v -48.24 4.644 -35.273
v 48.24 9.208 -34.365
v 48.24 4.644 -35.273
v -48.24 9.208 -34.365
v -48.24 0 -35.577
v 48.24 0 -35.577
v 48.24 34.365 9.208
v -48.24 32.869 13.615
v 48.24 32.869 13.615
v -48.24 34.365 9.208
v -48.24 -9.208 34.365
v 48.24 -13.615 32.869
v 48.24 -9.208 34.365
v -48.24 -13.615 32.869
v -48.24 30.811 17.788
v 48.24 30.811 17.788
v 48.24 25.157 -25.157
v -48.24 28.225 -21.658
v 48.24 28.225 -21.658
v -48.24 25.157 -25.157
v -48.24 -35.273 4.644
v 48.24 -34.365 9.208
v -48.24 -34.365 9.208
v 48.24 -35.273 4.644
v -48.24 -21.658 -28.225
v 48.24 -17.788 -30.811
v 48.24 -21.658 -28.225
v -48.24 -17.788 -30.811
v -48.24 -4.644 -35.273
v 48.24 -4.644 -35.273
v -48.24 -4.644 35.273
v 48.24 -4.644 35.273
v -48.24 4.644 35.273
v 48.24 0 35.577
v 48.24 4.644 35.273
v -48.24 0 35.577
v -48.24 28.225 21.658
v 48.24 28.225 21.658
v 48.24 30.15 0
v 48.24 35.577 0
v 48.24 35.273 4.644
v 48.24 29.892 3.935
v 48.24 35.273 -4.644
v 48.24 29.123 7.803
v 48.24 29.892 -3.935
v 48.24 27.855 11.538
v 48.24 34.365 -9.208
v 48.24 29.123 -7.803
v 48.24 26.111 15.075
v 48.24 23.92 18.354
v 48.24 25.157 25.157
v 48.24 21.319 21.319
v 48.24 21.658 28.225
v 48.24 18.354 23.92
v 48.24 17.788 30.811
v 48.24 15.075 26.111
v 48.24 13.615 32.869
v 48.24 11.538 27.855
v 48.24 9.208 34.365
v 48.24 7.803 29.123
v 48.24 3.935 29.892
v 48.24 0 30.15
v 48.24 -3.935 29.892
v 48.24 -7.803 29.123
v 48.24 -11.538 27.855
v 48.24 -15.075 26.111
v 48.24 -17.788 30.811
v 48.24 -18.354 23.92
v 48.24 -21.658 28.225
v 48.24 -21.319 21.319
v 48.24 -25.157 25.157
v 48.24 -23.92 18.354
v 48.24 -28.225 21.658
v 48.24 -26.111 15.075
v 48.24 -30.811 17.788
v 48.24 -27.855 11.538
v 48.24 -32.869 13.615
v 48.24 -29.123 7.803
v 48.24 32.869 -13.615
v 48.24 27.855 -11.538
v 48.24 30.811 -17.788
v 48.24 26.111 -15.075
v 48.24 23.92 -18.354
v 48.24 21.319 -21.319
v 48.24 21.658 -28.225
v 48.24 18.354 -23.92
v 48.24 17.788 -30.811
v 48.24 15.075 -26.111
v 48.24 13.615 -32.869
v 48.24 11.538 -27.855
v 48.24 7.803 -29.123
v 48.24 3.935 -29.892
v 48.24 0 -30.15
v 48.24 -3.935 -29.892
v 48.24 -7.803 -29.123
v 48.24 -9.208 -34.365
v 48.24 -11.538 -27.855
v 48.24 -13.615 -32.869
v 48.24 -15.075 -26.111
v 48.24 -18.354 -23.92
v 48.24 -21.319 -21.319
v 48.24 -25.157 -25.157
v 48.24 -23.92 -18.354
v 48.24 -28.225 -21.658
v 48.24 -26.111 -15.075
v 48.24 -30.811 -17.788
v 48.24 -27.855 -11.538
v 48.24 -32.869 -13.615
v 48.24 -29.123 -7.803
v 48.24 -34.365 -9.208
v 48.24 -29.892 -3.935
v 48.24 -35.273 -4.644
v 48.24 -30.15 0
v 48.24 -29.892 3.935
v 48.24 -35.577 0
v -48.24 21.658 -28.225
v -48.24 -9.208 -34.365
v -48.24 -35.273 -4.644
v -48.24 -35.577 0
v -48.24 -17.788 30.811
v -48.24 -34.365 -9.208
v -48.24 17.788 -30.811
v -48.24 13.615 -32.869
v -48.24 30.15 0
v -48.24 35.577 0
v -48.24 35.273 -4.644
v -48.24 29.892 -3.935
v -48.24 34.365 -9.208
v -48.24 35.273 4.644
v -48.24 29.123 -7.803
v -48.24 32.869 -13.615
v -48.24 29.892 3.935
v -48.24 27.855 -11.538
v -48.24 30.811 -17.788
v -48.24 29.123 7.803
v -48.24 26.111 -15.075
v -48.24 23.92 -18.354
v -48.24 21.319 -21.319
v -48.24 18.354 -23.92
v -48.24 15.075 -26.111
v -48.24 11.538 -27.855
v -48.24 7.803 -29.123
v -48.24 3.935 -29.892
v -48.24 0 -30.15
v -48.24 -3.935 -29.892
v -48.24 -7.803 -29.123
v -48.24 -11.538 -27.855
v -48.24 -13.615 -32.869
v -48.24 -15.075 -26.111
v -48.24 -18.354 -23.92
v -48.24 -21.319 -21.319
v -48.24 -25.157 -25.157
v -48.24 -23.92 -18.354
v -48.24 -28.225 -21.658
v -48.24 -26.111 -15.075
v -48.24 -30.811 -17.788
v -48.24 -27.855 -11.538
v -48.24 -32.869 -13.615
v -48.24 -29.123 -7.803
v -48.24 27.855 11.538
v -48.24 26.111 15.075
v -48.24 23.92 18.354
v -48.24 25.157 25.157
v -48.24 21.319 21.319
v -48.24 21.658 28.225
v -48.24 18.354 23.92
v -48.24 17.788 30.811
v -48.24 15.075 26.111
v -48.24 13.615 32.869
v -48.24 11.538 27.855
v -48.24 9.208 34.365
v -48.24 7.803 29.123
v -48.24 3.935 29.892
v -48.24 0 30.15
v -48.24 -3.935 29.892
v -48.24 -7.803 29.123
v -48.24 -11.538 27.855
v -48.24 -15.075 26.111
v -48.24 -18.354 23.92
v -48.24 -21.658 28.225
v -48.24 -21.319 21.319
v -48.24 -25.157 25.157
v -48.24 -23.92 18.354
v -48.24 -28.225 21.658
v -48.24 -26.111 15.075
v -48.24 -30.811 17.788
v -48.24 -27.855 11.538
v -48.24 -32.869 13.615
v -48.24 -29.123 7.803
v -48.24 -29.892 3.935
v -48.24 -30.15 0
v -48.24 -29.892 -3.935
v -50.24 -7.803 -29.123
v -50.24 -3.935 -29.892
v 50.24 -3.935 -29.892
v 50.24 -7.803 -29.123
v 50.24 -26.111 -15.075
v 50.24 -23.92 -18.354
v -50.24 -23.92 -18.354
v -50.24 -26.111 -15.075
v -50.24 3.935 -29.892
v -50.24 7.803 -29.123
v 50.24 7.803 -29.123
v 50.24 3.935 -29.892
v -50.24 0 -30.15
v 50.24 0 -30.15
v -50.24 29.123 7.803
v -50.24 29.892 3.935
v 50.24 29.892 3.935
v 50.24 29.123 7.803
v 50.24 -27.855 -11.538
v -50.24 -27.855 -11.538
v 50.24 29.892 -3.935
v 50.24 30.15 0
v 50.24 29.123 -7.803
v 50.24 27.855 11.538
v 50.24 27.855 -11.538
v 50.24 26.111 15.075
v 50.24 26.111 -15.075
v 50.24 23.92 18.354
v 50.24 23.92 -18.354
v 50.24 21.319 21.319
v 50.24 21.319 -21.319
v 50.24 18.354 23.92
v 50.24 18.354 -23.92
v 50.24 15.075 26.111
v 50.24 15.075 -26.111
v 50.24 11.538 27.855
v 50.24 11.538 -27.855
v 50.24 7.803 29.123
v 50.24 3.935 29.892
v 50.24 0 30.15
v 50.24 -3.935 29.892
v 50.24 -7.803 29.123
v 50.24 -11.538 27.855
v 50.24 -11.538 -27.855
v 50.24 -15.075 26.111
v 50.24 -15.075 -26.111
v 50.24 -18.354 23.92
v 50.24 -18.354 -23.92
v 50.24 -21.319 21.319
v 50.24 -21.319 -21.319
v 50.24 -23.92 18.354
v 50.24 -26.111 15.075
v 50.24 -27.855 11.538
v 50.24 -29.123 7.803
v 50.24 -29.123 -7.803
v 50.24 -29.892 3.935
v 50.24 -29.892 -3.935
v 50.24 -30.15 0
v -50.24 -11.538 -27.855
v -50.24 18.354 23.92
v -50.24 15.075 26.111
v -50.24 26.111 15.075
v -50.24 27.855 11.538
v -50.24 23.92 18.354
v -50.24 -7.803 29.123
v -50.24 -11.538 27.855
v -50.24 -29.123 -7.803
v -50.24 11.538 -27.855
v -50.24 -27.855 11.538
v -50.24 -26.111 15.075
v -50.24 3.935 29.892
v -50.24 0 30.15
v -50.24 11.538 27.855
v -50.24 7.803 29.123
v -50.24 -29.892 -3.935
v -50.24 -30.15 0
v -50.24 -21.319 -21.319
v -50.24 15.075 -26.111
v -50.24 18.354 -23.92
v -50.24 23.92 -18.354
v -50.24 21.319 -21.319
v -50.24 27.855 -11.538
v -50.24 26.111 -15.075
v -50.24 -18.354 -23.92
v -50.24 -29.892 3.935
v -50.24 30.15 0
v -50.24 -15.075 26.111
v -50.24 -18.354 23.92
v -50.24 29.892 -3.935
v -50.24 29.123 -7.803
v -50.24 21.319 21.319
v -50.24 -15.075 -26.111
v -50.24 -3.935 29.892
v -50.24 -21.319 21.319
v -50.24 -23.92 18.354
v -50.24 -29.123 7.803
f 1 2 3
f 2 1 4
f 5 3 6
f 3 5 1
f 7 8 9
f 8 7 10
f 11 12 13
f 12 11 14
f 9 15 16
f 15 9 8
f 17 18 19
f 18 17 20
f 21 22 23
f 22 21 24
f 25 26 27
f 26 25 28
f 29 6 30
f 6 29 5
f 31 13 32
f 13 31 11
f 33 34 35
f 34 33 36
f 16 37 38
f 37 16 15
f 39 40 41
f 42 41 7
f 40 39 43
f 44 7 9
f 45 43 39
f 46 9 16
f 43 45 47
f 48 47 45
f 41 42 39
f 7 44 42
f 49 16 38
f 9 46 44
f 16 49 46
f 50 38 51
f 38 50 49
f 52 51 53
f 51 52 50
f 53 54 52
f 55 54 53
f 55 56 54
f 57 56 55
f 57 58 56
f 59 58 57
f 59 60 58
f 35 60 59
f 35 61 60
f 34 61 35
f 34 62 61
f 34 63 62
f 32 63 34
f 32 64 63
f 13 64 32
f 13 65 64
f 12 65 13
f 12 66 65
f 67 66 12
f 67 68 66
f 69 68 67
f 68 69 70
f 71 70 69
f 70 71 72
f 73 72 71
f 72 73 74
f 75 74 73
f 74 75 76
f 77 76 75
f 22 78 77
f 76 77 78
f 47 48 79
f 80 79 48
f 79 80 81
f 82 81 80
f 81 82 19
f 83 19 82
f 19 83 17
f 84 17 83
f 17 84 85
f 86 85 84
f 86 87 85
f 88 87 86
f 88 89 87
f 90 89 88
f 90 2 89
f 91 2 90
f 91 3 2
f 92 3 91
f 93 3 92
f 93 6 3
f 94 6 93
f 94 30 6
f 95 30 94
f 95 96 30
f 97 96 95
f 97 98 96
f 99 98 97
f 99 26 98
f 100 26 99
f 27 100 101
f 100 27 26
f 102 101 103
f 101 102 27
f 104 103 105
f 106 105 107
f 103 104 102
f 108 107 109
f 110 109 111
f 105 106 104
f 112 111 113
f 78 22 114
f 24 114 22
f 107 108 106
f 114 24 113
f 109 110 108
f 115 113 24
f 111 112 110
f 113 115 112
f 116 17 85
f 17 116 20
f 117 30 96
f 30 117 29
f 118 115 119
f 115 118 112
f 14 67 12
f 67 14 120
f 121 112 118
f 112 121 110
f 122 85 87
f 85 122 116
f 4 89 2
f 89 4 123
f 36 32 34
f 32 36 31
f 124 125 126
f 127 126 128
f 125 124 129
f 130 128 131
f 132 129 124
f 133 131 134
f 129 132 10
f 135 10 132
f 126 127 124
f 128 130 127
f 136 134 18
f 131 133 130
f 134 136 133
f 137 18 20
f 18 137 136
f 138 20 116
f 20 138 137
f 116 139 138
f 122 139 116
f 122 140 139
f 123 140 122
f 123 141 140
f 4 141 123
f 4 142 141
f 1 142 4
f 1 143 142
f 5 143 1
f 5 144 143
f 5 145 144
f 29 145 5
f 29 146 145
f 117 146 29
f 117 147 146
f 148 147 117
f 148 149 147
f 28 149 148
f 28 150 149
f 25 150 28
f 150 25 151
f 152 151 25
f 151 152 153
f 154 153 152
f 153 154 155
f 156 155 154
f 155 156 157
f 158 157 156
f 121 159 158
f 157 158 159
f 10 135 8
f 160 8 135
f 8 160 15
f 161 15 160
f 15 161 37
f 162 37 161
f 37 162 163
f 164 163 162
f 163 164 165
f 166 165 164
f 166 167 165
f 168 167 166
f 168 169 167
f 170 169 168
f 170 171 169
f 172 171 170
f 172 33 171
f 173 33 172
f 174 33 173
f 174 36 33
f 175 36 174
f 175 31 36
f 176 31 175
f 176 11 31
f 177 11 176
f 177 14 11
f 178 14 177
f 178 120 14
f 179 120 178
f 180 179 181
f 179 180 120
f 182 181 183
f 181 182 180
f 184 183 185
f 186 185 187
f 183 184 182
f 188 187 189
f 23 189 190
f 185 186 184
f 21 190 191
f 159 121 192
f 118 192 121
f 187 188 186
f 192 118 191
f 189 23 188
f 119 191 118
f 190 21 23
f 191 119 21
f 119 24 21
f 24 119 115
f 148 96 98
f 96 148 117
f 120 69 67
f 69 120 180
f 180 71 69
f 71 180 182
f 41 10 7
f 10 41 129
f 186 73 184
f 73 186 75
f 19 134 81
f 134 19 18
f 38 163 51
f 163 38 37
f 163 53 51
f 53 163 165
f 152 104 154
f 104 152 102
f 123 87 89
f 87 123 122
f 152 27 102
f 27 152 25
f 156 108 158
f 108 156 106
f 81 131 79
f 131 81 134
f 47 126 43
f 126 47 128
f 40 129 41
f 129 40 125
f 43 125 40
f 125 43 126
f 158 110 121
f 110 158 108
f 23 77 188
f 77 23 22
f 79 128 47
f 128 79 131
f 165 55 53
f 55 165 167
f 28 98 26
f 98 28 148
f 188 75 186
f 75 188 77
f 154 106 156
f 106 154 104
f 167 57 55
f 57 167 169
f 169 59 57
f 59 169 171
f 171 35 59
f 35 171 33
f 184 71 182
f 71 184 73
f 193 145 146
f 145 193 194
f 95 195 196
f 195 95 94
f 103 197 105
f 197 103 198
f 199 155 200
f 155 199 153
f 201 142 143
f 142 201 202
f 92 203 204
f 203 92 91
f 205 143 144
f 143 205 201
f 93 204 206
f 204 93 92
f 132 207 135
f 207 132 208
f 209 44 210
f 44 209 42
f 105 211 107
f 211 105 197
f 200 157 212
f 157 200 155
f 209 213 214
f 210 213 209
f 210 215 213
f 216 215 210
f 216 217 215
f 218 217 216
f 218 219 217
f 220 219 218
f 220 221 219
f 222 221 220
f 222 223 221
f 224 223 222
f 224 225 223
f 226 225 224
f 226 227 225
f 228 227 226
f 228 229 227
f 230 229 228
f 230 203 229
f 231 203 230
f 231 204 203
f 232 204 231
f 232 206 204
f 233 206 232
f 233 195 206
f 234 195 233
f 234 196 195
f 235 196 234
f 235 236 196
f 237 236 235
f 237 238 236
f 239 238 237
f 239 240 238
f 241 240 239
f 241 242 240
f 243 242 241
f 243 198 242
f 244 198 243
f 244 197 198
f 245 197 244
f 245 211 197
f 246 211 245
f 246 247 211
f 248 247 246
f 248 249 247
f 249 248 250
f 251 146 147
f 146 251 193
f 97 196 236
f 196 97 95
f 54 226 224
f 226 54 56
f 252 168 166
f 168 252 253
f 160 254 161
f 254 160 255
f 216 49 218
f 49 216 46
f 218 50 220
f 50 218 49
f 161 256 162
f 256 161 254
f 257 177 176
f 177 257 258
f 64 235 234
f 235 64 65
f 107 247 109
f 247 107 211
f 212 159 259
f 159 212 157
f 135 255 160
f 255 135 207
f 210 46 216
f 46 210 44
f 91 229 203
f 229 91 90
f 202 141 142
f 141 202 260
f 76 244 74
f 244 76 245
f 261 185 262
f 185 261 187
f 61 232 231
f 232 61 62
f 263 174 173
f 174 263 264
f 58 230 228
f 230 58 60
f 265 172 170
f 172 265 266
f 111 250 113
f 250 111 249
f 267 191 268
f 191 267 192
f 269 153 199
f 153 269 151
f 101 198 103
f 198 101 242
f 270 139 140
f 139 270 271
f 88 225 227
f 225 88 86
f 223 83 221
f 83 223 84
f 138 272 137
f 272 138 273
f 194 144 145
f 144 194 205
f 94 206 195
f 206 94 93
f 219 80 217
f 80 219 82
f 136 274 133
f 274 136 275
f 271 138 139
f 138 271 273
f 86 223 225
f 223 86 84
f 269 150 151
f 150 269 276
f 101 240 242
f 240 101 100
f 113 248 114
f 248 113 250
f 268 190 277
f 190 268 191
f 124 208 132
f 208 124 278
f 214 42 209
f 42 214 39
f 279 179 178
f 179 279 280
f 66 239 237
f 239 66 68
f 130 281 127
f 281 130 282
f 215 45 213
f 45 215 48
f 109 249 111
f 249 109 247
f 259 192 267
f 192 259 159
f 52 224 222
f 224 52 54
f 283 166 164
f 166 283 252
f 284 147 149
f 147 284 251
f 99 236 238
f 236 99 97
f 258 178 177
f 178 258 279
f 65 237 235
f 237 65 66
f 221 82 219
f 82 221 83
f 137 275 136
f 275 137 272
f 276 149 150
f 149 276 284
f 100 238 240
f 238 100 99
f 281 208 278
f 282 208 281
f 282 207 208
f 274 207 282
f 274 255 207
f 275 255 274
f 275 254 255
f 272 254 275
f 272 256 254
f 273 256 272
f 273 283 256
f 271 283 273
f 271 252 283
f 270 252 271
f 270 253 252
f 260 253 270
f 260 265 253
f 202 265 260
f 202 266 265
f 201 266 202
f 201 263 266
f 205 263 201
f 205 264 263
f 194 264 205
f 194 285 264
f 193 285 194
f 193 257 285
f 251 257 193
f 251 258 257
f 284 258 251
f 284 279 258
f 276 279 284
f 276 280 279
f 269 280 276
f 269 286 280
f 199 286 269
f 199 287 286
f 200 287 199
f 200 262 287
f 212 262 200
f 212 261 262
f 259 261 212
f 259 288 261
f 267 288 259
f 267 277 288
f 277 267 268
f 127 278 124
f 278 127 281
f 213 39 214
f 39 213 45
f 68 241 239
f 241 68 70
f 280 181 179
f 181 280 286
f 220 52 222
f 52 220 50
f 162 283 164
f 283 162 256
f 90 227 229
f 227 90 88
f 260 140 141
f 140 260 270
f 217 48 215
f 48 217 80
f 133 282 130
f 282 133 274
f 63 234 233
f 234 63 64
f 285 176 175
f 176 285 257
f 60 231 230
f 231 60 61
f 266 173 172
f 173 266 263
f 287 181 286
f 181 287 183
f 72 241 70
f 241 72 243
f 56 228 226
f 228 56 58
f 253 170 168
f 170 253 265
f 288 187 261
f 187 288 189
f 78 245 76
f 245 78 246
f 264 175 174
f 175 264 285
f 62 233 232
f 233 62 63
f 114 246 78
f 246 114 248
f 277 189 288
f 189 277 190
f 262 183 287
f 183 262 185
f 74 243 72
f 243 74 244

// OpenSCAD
// Auto-generated by scripts/author_from_manifest.py (Phase D.3).
// Source: data/phase_d_manifest.json (sku_intent='victaulic-005-rigid-coupling-2in').
// Do not hand-edit — regenerate from the manifest.
//
// @part victaulic_005_rigid_coupling_2in
// @kind fitting
// @category fitting.coupling
// @display-name "Victaulic FireLock Style 005 Rigid Coupling 2\""
// @mfg victaulic
// @mfg-pn Style_005_2in
// @listing UL FM
// @price-usd 32.00
// @install-minutes 6
// @crew journeyman
// @param size_in number default=2 label="Size" unit="in"
// @port inlet position=[-0.05,0,0] direction=[-1,0,0] style=grooved size_in=2 role=run_a
// @port outlet position=[0.05,0,0] direction=[1,0,0] style=grooved size_in=2 role=run_b

size_in = 2.0;

function od_mm(nps) =
    nps ==   1  ? 33.4 :
    nps == 1.25 ? 42.2 :
    nps == 1.5  ? 48.3 :
    nps ==   2  ? 60.3 :
    nps == 2.5  ? 73.0 :
    nps ==   3  ? 88.9 :
    nps ==   4  ? 114.3 :
    nps ==   5  ? 141.3 :
    nps ==   6  ? 168.3 :
    nps ==   8  ? 219.1 :
    nps ==  10  ? 273.0 : 60.3;

od = od_mm(size_in);
len_mm = od * 1.6;

rotate([0, 90, 0])
    union() {
        cylinder(h = len_mm, d = od * 1.18, center = true, $fn = 48);
        cylinder(h = len_mm + 4, d = od, center = true, $fn = 48);
    }
